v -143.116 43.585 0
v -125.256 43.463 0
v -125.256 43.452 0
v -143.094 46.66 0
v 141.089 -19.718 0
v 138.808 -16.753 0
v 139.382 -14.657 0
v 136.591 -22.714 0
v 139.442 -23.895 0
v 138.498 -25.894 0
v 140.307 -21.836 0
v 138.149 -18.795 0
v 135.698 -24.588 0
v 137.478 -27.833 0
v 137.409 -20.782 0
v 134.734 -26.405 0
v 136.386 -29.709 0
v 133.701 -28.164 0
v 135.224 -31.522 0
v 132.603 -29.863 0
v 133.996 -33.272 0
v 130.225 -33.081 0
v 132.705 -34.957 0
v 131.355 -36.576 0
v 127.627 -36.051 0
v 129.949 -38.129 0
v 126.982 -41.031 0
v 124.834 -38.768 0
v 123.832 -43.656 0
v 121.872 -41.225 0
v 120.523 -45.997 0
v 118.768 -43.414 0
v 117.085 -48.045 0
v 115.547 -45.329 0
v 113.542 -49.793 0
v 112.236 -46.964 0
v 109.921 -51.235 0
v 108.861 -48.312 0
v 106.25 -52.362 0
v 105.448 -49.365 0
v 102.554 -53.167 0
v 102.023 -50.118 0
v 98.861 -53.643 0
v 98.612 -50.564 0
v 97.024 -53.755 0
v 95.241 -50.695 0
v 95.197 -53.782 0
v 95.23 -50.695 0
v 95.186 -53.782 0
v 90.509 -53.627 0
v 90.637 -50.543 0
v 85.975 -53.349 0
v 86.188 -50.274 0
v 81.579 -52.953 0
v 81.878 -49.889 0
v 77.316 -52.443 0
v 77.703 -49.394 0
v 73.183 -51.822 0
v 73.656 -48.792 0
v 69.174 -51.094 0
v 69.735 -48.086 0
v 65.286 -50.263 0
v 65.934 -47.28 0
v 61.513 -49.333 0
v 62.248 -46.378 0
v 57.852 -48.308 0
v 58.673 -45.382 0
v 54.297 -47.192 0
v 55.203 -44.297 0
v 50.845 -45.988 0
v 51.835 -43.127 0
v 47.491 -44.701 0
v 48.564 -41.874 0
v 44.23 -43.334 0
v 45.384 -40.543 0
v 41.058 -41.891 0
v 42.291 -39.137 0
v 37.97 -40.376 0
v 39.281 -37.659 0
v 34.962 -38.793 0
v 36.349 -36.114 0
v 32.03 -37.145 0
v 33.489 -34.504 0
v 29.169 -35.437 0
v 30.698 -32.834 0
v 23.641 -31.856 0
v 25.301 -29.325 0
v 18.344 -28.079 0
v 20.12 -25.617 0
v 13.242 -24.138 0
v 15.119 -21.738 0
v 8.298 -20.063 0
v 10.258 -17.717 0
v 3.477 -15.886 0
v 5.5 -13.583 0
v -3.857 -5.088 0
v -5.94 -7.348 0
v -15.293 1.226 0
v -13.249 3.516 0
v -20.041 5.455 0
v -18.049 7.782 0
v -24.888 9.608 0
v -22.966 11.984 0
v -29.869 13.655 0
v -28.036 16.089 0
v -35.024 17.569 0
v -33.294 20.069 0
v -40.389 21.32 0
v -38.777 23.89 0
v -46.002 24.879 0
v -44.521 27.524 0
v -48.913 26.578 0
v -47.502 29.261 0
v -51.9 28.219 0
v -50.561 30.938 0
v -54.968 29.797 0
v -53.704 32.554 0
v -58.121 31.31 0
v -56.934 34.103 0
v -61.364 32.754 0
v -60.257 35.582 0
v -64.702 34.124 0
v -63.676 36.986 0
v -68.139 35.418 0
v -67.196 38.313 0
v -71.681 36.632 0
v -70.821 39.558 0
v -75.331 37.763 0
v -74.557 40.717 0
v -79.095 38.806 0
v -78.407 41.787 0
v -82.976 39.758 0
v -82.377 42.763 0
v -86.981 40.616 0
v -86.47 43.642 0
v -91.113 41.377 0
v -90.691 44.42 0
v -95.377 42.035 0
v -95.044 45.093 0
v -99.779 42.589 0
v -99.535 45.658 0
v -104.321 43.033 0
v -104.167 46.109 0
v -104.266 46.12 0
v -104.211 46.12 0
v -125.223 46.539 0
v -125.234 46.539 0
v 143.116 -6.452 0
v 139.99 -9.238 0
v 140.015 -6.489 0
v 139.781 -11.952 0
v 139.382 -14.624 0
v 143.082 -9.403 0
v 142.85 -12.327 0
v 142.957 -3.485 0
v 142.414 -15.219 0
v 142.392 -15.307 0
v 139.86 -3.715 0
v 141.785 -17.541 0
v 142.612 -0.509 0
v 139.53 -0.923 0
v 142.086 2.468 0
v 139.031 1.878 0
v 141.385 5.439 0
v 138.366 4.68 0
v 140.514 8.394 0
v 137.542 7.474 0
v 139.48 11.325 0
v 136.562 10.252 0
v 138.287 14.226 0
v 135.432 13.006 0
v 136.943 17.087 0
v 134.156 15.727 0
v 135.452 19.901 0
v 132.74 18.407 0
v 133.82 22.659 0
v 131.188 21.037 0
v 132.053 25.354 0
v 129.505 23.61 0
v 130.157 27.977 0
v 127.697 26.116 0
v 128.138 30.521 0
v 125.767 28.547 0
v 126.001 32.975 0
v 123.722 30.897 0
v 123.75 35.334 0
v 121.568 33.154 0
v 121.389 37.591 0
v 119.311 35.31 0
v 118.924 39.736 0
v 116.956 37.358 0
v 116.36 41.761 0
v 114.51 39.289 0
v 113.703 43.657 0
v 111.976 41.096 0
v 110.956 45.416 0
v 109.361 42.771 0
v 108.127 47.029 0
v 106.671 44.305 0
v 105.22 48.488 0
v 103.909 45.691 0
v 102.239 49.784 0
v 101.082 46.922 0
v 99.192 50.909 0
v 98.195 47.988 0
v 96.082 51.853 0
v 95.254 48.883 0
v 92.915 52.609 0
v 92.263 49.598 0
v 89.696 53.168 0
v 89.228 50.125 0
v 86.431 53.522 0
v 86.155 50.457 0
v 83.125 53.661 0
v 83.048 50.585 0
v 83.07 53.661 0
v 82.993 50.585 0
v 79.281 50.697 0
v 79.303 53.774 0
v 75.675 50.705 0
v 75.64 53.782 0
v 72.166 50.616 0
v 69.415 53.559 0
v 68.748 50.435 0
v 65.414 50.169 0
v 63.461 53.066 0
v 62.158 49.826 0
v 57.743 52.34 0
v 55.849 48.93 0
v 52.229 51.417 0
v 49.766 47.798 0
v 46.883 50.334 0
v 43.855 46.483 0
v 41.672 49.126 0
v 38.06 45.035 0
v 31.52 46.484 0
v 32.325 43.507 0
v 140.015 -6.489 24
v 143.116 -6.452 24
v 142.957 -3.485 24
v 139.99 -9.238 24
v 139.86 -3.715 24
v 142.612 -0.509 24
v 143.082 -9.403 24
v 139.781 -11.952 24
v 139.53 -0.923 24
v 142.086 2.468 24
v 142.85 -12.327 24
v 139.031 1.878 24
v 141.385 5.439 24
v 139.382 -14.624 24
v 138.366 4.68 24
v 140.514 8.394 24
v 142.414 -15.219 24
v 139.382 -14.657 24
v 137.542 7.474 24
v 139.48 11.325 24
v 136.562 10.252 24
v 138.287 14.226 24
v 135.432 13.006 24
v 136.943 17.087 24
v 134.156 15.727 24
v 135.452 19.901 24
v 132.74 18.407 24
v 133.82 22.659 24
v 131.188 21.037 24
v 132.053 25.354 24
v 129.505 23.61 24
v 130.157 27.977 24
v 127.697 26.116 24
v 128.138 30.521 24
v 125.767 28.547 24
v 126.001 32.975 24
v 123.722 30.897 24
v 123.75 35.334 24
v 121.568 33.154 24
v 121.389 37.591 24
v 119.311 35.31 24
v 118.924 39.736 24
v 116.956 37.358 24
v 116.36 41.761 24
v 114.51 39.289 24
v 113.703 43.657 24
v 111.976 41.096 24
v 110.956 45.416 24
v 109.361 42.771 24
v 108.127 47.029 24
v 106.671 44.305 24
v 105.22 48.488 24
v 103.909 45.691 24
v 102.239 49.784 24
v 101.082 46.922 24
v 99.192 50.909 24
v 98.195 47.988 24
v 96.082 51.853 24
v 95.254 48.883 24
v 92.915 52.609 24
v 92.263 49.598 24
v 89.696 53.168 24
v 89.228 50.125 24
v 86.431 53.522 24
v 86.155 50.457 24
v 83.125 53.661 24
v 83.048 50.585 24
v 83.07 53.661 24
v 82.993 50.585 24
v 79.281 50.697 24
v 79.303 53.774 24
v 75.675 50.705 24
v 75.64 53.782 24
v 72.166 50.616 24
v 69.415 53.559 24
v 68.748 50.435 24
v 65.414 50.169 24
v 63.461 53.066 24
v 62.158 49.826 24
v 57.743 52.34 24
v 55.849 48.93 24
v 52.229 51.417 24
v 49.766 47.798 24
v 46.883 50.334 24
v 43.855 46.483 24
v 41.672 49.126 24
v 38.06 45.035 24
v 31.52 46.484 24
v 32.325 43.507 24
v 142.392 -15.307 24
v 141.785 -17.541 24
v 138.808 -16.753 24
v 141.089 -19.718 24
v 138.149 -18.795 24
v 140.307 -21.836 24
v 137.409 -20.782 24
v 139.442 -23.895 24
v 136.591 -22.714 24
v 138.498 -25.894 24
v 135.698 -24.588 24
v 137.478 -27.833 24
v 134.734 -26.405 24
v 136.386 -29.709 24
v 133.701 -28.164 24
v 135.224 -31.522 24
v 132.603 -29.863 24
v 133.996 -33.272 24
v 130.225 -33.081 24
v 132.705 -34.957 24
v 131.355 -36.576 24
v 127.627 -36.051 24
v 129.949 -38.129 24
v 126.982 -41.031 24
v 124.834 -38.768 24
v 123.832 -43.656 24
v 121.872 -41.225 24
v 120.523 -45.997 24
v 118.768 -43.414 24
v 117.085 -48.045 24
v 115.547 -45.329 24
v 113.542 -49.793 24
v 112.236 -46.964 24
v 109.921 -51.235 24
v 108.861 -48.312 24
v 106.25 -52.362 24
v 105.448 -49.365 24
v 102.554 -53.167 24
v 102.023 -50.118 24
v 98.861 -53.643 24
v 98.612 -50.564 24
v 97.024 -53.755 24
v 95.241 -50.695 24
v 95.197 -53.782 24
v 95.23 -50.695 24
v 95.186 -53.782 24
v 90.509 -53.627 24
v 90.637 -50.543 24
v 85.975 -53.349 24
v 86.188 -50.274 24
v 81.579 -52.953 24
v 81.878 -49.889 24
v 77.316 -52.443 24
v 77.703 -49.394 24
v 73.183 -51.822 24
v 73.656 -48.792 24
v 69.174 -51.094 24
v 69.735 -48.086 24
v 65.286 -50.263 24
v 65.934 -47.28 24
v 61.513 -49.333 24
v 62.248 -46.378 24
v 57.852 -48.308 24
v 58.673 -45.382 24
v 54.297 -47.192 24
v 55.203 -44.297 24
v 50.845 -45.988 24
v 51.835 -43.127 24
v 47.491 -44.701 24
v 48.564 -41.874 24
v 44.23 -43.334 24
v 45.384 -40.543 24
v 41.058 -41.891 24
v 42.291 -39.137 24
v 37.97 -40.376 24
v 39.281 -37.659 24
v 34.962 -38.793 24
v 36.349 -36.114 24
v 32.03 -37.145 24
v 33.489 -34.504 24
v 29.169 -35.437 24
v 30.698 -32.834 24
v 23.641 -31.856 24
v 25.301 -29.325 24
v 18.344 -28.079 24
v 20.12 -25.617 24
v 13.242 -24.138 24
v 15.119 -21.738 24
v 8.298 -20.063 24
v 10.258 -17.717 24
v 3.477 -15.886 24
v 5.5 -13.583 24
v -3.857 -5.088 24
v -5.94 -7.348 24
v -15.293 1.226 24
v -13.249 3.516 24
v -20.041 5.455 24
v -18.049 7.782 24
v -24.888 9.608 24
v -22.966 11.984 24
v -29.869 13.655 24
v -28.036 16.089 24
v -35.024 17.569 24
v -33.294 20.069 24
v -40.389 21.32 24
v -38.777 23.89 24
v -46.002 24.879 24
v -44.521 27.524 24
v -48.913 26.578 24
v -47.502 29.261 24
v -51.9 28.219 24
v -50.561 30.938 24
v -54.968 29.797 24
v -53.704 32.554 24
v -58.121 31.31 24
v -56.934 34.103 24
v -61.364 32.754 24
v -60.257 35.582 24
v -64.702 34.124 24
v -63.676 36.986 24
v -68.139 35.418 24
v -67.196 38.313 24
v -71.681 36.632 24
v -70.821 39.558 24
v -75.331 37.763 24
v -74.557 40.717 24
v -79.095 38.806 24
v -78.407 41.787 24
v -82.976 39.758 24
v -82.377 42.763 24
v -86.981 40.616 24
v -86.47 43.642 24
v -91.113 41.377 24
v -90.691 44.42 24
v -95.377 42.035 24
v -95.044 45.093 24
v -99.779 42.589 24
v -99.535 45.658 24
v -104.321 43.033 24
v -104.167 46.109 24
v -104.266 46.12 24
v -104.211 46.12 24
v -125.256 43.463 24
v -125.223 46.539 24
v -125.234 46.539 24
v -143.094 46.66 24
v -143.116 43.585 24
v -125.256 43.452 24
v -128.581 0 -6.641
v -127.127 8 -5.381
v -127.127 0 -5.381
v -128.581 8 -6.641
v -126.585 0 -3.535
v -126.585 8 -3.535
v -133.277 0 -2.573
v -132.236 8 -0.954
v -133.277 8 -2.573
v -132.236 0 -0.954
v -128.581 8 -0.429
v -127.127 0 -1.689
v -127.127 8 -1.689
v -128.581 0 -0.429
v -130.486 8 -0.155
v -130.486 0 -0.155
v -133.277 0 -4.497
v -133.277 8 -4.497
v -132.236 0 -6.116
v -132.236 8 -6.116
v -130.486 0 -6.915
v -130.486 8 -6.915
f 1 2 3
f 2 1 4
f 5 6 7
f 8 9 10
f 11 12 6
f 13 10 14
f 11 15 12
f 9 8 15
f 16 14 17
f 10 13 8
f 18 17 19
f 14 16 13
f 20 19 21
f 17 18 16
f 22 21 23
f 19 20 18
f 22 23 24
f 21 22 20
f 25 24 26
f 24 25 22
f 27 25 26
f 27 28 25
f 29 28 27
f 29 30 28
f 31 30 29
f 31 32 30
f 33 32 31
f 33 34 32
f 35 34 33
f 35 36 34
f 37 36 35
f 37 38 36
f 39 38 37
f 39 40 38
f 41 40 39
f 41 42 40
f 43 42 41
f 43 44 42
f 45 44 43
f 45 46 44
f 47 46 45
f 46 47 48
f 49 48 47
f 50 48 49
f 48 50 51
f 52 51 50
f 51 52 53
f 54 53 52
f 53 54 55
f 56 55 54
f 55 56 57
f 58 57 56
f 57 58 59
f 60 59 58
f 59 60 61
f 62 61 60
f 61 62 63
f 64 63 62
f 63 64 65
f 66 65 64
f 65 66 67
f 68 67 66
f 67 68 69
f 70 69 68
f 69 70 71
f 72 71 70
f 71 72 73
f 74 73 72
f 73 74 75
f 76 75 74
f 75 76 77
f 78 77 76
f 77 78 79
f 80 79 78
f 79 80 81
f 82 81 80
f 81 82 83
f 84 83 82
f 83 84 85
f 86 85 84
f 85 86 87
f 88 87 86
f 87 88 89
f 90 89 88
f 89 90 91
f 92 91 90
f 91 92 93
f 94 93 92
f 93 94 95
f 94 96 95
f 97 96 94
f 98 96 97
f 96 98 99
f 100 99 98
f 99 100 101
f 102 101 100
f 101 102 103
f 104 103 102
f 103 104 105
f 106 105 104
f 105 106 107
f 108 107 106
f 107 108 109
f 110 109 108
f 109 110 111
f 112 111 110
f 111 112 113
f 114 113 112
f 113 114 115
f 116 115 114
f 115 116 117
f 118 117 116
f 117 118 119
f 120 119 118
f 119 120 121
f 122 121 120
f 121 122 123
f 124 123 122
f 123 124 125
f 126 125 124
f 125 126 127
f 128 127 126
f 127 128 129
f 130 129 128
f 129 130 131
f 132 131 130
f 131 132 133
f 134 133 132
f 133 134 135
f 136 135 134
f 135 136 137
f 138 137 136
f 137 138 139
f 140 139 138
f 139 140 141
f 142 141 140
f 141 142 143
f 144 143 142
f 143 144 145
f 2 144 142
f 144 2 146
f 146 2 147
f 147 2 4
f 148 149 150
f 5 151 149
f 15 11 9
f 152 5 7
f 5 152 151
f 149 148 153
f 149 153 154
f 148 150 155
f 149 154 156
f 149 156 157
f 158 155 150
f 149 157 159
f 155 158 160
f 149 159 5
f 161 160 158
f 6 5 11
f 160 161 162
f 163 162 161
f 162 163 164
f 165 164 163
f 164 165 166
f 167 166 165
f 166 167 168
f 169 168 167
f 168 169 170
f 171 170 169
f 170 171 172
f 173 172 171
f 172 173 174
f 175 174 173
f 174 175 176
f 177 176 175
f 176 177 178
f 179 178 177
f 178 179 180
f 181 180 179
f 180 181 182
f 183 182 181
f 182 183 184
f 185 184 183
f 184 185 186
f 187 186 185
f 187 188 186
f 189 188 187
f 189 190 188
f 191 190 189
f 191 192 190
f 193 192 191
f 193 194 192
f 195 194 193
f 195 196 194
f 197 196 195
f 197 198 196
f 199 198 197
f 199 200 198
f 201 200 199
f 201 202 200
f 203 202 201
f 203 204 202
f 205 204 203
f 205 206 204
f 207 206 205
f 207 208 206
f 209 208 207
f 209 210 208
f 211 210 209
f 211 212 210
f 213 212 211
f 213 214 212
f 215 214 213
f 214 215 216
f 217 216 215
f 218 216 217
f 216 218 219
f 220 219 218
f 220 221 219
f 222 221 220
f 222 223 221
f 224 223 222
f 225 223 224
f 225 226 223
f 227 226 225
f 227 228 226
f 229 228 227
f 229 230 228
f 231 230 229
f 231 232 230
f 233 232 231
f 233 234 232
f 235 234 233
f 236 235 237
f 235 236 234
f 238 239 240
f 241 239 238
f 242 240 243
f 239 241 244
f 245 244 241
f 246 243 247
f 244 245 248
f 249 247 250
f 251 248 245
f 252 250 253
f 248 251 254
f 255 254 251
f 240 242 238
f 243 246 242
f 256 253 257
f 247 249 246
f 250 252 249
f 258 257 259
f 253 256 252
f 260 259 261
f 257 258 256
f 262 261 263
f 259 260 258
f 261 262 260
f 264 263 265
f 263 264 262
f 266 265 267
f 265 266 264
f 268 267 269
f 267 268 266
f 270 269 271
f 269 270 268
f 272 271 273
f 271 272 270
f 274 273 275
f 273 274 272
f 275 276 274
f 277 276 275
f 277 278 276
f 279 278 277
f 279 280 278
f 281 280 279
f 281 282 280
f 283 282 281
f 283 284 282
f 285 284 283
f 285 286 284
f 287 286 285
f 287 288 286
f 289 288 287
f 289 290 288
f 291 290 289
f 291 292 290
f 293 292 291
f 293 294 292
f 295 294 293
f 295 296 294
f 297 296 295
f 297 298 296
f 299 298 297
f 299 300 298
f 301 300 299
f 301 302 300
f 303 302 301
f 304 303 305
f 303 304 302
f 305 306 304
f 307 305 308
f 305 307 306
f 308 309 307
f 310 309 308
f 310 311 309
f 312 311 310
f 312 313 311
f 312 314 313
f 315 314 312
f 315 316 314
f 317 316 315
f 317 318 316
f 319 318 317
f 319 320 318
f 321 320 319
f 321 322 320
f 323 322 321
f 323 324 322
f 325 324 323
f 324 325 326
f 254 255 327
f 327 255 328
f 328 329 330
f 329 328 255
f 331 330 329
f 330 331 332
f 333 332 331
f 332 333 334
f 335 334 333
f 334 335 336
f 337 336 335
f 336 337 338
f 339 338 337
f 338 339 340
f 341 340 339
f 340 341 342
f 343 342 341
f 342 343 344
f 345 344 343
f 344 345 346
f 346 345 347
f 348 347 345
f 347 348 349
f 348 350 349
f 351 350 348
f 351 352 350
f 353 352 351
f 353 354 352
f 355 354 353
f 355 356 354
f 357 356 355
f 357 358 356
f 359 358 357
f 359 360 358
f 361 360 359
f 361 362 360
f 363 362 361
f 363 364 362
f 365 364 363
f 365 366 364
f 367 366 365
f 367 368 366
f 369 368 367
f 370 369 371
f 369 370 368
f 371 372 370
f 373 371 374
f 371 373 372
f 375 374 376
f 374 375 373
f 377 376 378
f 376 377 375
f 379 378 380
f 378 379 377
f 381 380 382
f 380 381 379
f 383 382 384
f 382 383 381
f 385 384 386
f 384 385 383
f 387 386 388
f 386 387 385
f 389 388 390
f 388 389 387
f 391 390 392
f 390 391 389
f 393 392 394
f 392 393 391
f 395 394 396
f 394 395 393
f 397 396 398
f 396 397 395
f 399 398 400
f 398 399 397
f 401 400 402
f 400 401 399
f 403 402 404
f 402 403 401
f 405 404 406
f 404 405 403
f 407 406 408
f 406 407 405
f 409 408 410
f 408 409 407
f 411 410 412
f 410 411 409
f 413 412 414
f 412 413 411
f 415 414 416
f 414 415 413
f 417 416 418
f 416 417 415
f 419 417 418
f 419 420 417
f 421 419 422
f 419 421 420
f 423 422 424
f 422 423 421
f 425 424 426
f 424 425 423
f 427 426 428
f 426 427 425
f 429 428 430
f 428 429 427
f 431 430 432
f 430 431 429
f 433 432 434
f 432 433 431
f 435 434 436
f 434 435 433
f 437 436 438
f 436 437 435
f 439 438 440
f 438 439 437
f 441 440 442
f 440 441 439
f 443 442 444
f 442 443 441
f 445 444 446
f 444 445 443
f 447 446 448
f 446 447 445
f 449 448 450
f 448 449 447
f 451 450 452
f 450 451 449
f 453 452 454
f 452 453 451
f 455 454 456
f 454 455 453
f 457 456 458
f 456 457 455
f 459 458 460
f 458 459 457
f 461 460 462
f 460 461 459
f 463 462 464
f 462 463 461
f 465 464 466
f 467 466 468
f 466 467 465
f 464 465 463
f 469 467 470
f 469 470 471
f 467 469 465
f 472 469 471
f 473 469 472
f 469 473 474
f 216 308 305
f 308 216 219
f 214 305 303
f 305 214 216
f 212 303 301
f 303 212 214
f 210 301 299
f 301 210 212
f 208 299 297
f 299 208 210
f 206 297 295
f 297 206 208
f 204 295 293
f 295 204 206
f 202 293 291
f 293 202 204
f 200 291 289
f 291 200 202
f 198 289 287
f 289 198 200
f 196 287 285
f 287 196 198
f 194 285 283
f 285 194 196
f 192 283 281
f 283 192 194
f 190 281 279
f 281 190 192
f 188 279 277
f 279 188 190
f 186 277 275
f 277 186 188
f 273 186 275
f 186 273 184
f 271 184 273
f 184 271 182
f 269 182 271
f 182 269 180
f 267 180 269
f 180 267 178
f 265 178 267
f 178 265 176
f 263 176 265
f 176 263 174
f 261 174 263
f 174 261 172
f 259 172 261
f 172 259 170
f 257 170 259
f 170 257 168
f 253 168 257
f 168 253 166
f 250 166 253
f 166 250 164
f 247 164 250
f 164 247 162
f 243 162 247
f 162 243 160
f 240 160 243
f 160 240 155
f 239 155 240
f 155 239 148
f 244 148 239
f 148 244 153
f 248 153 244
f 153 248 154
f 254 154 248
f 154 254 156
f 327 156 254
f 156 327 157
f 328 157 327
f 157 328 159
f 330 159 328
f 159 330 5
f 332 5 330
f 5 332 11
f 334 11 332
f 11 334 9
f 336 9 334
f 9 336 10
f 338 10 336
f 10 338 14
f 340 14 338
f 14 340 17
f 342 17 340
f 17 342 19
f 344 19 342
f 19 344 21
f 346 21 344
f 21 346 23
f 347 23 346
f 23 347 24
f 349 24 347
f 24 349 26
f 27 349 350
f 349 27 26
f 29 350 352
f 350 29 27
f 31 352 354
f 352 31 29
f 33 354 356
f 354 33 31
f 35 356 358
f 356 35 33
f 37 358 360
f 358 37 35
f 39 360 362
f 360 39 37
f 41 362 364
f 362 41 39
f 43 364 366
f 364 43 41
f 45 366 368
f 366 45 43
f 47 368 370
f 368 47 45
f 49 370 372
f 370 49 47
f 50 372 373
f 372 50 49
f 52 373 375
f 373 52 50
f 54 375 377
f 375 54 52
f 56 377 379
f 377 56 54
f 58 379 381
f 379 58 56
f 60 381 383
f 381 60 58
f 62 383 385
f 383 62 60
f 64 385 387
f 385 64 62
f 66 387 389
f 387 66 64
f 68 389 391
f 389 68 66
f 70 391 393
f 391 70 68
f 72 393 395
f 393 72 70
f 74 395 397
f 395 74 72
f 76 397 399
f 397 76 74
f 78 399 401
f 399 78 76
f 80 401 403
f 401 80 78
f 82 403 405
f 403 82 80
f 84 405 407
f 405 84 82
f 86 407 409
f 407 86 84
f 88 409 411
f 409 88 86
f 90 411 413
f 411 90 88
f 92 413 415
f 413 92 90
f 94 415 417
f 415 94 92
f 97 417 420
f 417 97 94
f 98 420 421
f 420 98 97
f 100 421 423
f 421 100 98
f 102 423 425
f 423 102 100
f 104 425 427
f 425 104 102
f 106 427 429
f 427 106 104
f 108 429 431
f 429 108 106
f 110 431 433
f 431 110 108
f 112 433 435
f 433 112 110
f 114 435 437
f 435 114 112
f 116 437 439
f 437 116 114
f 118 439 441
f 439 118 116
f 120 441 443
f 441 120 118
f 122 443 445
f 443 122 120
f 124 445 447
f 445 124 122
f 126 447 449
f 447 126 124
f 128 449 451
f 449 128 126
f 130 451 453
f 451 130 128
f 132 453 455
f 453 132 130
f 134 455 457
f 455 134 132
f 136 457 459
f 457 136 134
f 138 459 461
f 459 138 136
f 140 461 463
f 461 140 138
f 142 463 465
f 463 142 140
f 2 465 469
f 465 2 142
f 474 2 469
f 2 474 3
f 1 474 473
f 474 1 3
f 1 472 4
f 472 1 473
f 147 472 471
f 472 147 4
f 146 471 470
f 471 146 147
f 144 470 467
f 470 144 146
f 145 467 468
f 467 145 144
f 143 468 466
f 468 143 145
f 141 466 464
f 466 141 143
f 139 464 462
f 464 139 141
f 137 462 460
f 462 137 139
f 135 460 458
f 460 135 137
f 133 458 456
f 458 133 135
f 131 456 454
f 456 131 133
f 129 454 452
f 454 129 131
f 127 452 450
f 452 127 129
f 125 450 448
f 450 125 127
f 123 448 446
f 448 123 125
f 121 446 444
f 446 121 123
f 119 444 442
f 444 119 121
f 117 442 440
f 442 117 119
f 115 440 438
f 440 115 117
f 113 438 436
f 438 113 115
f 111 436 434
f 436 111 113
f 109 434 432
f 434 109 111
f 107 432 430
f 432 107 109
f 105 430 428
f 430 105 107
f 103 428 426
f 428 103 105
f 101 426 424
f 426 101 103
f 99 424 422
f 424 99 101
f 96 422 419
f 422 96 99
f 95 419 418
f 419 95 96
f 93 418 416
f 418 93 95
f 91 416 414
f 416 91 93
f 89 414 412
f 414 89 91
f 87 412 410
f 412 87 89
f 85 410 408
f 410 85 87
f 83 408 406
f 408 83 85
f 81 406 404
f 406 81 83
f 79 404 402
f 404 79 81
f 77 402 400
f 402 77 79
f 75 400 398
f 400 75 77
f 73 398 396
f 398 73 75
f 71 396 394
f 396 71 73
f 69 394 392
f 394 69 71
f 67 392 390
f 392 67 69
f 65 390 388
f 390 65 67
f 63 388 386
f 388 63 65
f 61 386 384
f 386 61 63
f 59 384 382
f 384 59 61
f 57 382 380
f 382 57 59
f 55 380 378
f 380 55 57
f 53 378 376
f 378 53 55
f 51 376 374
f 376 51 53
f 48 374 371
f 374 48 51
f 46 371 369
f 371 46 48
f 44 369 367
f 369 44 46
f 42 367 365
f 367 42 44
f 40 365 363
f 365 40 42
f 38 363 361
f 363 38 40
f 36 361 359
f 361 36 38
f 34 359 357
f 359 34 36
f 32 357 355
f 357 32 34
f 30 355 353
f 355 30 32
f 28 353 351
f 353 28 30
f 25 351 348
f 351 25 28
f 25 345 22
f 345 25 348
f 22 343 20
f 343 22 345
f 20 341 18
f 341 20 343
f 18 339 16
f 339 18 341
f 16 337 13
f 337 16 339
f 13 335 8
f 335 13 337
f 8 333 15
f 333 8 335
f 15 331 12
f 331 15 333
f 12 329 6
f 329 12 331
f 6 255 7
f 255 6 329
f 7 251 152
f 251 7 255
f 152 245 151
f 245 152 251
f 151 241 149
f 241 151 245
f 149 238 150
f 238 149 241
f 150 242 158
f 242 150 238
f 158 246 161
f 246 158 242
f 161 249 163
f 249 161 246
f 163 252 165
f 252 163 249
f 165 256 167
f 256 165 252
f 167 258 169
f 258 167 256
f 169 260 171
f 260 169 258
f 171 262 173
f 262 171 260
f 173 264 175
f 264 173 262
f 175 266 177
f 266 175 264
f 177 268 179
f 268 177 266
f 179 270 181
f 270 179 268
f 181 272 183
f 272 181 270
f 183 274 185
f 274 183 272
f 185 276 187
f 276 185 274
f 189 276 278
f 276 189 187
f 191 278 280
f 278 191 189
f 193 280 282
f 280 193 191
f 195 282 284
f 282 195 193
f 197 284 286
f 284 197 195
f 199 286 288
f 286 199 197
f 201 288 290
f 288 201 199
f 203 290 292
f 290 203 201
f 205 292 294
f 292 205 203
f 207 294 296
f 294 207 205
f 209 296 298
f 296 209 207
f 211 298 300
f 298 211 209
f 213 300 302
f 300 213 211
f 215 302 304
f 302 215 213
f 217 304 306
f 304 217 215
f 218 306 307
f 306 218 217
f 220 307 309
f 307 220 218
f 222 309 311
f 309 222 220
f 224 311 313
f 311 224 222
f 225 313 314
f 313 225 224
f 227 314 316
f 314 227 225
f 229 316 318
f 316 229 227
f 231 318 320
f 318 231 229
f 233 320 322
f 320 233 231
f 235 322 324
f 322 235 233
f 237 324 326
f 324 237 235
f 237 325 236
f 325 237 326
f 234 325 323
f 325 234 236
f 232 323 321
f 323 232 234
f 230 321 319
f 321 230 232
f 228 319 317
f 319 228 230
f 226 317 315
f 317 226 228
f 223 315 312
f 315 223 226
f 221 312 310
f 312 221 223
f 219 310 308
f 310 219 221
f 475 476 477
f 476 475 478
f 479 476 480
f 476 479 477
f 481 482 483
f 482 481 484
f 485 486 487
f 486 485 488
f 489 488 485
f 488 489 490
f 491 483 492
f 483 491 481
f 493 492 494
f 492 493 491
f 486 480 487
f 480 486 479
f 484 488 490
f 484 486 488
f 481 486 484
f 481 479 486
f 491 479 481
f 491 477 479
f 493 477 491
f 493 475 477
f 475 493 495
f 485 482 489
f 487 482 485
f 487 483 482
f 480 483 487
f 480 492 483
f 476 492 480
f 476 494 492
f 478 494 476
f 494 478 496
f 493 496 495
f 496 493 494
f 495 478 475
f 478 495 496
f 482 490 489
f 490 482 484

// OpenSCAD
// Module names are of the form poly_<inkscape-path-id>().  As a result,
// you can associate a polygon in this OpenSCAD program with the corresponding
// SVG element in the Inkscape document by looking for the XML element with
// the attribute id="inkscape-path-id".

// fudge value is used to ensure that subtracted solids are a tad taller
// in the z dimension than the polygon being subtracted from.  This helps
// keep the resulting .stl file manifold.
fudge = 0.1;

module poly_path8913(h)
{
  scale([25.4/90, -25.4/90, 1]) union()
  {
    linear_extrude(height=h)
      polygon([[268.015087,-190.566316],[245.958752,-189.776239],[224.861208,-188.030515],[204.602385,-185.458063],[185.062217,-182.187800],[166.120634,-178.348641],[147.657568,-174.069504],[111.686712,-164.706962],[114.538279,-154.160095],[134.856525,-159.573512],[155.390961,-164.702163],[176.336806,-169.362908],[197.889278,-173.372610],[220.243597,-176.548129],[231.782455,-177.765839],[243.594981,-178.706326],[255.705577,-179.346698],[268.138648,-179.664063],[280.918593,-179.635528],[294.069816,-179.238200],[294.147942,-179.238200],[294.265067,-179.238200],[305.272282,-178.783618],[316.161910,-177.608148],[326.914955,-175.739816],[337.512421,-173.206646],[347.935314,-170.036663],[358.164636,-166.257892],[368.181393,-161.898357],[377.966590,-156.986085],[387.501230,-151.549100],[396.766317,-145.615426],[405.742857,-139.213089],[414.411854,-132.370114],[422.754312,-125.114525],[430.751235,-117.474347],[438.383629,-109.477606],[445.632496,-101.152325],[452.469342,-92.536412],[458.877437,-83.656065],[464.839467,-74.540959],[470.338113,-65.220770],[475.356060,-55.725172],[479.875991,-46.083840],[483.880589,-36.326450],[487.352538,-26.482677],[490.274521,-16.582196],[492.629222,-6.654681],[494.399323,3.270192],[495.567508,13.162748],[496.116462,22.993312],[496.028866,32.732209],[495.287405,42.349764],[493.874761,51.816302],[493.874761,51.933427],[491.840139,59.361525],[489.505778,66.597564],[486.883245,73.638570],[483.984108,80.481573],[480.819933,87.123598],[477.402287,93.561675],[473.742737,99.792832],[469.852849,105.814094],[461.428330,117.215052],[452.221265,127.740770],[442.324188,137.367470],[431.829635,146.071375],[420.830141,153.828707],[409.418240,160.615688],[397.686468,166.408540],[385.727359,171.183485],[373.633449,174.916745],[361.497273,177.584542],[349.411365,179.163099],[337.468261,179.628638],[337.429261,179.628638],[321.156146,179.090936],[305.392119,178.135093],[290.120476,176.773809],[275.324508,175.019787],[260.987510,172.885730],[247.092777,170.384339],[233.623601,167.528319],[220.563277,164.330369],[207.895098,160.803194],[195.602359,156.959495],[183.668353,152.811976],[172.076373,148.373337],[160.809715,143.656282],[149.851671,138.673513],[139.185535,133.437732],[128.794602,127.961641],[118.662165,122.257944],[108.771518,116.339342],[89.648769,103.908235],[71.292705,90.769937],[53.569678,77.026069],[36.346039,62.778249],[19.488137,48.128096],[-13.665051,18.027267],[-46.947046,-12.457570],[-63.954614,-27.574340],[-81.376352,-42.461490],[-99.339603,-57.009629],[-117.971710,-71.109368],[-137.400016,-84.651316],[-157.751864,-97.526083],[-168.313911,-103.679089],[-179.154597,-109.624278],[-190.289840,-115.347976],[-201.735558,-120.836510],[-213.507668,-126.076206],[-225.622089,-131.053390],[-238.094739,-135.754389],[-250.941534,-140.165528],[-264.178394,-144.273133],[-277.821236,-148.063531],[-291.885977,-151.523049],[-306.388536,-154.638011],[-321.344831,-157.394745],[-336.770779,-159.779577],[-352.682299,-161.778832],[-369.095307,-163.378838],[-369.251557,-163.417838],[-369.446870,-163.417838],[-443.704802,-164.902212],[-443.743864,-164.902212],[-507.025215,-165.331899],[-507.103340,-154.433470],[-443.821989,-153.964721],[-443.821989,-154.003721],[-369.642183,-152.480284],[-353.545949,-150.904370],[-337.951281,-148.943310],[-322.841588,-146.609796],[-308.200281,-143.916518],[-294.010766,-140.876167],[-280.256453,-137.501434],[-266.920752,-133.805009],[-253.987071,-129.799582],[-241.438818,-125.497846],[-229.259404,-120.912490],[-217.432236,-116.056205],[-205.940723,-110.941681],[-194.768276,-105.581610],[-183.898301,-99.988682],[-173.314209,-94.175587],[-162.999409,-88.155017],[-143.111317,-75.542213],[-124.101297,-62.251794],[-105.836620,-48.385286],[-88.184557,-34.044215],[-71.012380,-19.330105],[-54.187360,-4.344483],[-21.047875,26.035198],[12.318469,56.289520],[29.401061,71.090612],[46.919072,85.528288],[64.999358,99.493022],[83.768772,112.875288],[103.354170,125.565559],[113.492504,131.616969],[123.882405,137.454307],[134.539729,143.063884],[145.480333,148.432007],[156.720074,153.544987],[168.274808,158.389133],[180.160393,162.950753],[192.392685,167.216156],[204.987542,171.171653],[217.960819,174.803551],[231.328374,178.098161],[245.106064,181.041792],[259.309745,183.620752],[273.955274,185.821350],[289.058509,187.629897],[304.635305,189.032701],[320.701520,190.016071],[337.273011,190.566316],[337.312011,190.566316],[343.784631,190.470345],[350.294813,190.072848],[363.380658,188.386419],[376.475148,185.533319],[389.483885,181.539839],[402.312469,176.432270],[414.866502,170.236901],[427.051587,162.980024],[438.773325,154.687929],[449.937316,145.386907],[460.449163,135.103247],[465.431033,129.601144],[470.214467,123.863240],[474.787667,117.892823],[479.138831,111.693178],[483.256160,105.267591],[487.127854,98.619350],[490.742114,91.751739],[494.087140,84.668046],[497.151131,77.371557],[499.922289,69.865558],[502.388813,62.153335],[504.538903,54.238175],[504.577903,54.081925],[504.616903,53.925676],[506.161322,43.679807],[506.983354,33.316051],[507.103340,22.862999],[506.541618,12.349239],[505.318527,1.803360],[503.454405,-8.746047],[500.969591,-19.270393],[497.884424,-29.741089],[494.219242,-40.129545],[489.994384,-50.407172],[485.230189,-60.545380],[479.946995,-70.515580],[474.165142,-80.289182],[467.904968,-89.837597],[461.186811,-99.132235],[454.031010,-108.144507],[446.461242,-116.839633],[438.484720,-125.200117],[430.120075,-133.195650],[421.385941,-140.795925],[412.300950,-147.970631],[402.883737,-154.689461],[393.152933,-160.922105],[383.127171,-166.638256],[372.825086,-171.807603],[362.265308,-176.399840],[351.466472,-180.384656],[340.447211,-183.731743],[329.226156,-186.410793],[317.821942,-188.391496],[306.253202,-189.643544],[294.538567,-190.136629],[294.343254,-190.136629],[280.994408,-190.537791],[268.015087,-190.566316]]);
  }
}

poly_path8913(24);

rotate([-90,0,0])
translate([-130,3.535,0])
cylinder(r=3.415,h=8);
